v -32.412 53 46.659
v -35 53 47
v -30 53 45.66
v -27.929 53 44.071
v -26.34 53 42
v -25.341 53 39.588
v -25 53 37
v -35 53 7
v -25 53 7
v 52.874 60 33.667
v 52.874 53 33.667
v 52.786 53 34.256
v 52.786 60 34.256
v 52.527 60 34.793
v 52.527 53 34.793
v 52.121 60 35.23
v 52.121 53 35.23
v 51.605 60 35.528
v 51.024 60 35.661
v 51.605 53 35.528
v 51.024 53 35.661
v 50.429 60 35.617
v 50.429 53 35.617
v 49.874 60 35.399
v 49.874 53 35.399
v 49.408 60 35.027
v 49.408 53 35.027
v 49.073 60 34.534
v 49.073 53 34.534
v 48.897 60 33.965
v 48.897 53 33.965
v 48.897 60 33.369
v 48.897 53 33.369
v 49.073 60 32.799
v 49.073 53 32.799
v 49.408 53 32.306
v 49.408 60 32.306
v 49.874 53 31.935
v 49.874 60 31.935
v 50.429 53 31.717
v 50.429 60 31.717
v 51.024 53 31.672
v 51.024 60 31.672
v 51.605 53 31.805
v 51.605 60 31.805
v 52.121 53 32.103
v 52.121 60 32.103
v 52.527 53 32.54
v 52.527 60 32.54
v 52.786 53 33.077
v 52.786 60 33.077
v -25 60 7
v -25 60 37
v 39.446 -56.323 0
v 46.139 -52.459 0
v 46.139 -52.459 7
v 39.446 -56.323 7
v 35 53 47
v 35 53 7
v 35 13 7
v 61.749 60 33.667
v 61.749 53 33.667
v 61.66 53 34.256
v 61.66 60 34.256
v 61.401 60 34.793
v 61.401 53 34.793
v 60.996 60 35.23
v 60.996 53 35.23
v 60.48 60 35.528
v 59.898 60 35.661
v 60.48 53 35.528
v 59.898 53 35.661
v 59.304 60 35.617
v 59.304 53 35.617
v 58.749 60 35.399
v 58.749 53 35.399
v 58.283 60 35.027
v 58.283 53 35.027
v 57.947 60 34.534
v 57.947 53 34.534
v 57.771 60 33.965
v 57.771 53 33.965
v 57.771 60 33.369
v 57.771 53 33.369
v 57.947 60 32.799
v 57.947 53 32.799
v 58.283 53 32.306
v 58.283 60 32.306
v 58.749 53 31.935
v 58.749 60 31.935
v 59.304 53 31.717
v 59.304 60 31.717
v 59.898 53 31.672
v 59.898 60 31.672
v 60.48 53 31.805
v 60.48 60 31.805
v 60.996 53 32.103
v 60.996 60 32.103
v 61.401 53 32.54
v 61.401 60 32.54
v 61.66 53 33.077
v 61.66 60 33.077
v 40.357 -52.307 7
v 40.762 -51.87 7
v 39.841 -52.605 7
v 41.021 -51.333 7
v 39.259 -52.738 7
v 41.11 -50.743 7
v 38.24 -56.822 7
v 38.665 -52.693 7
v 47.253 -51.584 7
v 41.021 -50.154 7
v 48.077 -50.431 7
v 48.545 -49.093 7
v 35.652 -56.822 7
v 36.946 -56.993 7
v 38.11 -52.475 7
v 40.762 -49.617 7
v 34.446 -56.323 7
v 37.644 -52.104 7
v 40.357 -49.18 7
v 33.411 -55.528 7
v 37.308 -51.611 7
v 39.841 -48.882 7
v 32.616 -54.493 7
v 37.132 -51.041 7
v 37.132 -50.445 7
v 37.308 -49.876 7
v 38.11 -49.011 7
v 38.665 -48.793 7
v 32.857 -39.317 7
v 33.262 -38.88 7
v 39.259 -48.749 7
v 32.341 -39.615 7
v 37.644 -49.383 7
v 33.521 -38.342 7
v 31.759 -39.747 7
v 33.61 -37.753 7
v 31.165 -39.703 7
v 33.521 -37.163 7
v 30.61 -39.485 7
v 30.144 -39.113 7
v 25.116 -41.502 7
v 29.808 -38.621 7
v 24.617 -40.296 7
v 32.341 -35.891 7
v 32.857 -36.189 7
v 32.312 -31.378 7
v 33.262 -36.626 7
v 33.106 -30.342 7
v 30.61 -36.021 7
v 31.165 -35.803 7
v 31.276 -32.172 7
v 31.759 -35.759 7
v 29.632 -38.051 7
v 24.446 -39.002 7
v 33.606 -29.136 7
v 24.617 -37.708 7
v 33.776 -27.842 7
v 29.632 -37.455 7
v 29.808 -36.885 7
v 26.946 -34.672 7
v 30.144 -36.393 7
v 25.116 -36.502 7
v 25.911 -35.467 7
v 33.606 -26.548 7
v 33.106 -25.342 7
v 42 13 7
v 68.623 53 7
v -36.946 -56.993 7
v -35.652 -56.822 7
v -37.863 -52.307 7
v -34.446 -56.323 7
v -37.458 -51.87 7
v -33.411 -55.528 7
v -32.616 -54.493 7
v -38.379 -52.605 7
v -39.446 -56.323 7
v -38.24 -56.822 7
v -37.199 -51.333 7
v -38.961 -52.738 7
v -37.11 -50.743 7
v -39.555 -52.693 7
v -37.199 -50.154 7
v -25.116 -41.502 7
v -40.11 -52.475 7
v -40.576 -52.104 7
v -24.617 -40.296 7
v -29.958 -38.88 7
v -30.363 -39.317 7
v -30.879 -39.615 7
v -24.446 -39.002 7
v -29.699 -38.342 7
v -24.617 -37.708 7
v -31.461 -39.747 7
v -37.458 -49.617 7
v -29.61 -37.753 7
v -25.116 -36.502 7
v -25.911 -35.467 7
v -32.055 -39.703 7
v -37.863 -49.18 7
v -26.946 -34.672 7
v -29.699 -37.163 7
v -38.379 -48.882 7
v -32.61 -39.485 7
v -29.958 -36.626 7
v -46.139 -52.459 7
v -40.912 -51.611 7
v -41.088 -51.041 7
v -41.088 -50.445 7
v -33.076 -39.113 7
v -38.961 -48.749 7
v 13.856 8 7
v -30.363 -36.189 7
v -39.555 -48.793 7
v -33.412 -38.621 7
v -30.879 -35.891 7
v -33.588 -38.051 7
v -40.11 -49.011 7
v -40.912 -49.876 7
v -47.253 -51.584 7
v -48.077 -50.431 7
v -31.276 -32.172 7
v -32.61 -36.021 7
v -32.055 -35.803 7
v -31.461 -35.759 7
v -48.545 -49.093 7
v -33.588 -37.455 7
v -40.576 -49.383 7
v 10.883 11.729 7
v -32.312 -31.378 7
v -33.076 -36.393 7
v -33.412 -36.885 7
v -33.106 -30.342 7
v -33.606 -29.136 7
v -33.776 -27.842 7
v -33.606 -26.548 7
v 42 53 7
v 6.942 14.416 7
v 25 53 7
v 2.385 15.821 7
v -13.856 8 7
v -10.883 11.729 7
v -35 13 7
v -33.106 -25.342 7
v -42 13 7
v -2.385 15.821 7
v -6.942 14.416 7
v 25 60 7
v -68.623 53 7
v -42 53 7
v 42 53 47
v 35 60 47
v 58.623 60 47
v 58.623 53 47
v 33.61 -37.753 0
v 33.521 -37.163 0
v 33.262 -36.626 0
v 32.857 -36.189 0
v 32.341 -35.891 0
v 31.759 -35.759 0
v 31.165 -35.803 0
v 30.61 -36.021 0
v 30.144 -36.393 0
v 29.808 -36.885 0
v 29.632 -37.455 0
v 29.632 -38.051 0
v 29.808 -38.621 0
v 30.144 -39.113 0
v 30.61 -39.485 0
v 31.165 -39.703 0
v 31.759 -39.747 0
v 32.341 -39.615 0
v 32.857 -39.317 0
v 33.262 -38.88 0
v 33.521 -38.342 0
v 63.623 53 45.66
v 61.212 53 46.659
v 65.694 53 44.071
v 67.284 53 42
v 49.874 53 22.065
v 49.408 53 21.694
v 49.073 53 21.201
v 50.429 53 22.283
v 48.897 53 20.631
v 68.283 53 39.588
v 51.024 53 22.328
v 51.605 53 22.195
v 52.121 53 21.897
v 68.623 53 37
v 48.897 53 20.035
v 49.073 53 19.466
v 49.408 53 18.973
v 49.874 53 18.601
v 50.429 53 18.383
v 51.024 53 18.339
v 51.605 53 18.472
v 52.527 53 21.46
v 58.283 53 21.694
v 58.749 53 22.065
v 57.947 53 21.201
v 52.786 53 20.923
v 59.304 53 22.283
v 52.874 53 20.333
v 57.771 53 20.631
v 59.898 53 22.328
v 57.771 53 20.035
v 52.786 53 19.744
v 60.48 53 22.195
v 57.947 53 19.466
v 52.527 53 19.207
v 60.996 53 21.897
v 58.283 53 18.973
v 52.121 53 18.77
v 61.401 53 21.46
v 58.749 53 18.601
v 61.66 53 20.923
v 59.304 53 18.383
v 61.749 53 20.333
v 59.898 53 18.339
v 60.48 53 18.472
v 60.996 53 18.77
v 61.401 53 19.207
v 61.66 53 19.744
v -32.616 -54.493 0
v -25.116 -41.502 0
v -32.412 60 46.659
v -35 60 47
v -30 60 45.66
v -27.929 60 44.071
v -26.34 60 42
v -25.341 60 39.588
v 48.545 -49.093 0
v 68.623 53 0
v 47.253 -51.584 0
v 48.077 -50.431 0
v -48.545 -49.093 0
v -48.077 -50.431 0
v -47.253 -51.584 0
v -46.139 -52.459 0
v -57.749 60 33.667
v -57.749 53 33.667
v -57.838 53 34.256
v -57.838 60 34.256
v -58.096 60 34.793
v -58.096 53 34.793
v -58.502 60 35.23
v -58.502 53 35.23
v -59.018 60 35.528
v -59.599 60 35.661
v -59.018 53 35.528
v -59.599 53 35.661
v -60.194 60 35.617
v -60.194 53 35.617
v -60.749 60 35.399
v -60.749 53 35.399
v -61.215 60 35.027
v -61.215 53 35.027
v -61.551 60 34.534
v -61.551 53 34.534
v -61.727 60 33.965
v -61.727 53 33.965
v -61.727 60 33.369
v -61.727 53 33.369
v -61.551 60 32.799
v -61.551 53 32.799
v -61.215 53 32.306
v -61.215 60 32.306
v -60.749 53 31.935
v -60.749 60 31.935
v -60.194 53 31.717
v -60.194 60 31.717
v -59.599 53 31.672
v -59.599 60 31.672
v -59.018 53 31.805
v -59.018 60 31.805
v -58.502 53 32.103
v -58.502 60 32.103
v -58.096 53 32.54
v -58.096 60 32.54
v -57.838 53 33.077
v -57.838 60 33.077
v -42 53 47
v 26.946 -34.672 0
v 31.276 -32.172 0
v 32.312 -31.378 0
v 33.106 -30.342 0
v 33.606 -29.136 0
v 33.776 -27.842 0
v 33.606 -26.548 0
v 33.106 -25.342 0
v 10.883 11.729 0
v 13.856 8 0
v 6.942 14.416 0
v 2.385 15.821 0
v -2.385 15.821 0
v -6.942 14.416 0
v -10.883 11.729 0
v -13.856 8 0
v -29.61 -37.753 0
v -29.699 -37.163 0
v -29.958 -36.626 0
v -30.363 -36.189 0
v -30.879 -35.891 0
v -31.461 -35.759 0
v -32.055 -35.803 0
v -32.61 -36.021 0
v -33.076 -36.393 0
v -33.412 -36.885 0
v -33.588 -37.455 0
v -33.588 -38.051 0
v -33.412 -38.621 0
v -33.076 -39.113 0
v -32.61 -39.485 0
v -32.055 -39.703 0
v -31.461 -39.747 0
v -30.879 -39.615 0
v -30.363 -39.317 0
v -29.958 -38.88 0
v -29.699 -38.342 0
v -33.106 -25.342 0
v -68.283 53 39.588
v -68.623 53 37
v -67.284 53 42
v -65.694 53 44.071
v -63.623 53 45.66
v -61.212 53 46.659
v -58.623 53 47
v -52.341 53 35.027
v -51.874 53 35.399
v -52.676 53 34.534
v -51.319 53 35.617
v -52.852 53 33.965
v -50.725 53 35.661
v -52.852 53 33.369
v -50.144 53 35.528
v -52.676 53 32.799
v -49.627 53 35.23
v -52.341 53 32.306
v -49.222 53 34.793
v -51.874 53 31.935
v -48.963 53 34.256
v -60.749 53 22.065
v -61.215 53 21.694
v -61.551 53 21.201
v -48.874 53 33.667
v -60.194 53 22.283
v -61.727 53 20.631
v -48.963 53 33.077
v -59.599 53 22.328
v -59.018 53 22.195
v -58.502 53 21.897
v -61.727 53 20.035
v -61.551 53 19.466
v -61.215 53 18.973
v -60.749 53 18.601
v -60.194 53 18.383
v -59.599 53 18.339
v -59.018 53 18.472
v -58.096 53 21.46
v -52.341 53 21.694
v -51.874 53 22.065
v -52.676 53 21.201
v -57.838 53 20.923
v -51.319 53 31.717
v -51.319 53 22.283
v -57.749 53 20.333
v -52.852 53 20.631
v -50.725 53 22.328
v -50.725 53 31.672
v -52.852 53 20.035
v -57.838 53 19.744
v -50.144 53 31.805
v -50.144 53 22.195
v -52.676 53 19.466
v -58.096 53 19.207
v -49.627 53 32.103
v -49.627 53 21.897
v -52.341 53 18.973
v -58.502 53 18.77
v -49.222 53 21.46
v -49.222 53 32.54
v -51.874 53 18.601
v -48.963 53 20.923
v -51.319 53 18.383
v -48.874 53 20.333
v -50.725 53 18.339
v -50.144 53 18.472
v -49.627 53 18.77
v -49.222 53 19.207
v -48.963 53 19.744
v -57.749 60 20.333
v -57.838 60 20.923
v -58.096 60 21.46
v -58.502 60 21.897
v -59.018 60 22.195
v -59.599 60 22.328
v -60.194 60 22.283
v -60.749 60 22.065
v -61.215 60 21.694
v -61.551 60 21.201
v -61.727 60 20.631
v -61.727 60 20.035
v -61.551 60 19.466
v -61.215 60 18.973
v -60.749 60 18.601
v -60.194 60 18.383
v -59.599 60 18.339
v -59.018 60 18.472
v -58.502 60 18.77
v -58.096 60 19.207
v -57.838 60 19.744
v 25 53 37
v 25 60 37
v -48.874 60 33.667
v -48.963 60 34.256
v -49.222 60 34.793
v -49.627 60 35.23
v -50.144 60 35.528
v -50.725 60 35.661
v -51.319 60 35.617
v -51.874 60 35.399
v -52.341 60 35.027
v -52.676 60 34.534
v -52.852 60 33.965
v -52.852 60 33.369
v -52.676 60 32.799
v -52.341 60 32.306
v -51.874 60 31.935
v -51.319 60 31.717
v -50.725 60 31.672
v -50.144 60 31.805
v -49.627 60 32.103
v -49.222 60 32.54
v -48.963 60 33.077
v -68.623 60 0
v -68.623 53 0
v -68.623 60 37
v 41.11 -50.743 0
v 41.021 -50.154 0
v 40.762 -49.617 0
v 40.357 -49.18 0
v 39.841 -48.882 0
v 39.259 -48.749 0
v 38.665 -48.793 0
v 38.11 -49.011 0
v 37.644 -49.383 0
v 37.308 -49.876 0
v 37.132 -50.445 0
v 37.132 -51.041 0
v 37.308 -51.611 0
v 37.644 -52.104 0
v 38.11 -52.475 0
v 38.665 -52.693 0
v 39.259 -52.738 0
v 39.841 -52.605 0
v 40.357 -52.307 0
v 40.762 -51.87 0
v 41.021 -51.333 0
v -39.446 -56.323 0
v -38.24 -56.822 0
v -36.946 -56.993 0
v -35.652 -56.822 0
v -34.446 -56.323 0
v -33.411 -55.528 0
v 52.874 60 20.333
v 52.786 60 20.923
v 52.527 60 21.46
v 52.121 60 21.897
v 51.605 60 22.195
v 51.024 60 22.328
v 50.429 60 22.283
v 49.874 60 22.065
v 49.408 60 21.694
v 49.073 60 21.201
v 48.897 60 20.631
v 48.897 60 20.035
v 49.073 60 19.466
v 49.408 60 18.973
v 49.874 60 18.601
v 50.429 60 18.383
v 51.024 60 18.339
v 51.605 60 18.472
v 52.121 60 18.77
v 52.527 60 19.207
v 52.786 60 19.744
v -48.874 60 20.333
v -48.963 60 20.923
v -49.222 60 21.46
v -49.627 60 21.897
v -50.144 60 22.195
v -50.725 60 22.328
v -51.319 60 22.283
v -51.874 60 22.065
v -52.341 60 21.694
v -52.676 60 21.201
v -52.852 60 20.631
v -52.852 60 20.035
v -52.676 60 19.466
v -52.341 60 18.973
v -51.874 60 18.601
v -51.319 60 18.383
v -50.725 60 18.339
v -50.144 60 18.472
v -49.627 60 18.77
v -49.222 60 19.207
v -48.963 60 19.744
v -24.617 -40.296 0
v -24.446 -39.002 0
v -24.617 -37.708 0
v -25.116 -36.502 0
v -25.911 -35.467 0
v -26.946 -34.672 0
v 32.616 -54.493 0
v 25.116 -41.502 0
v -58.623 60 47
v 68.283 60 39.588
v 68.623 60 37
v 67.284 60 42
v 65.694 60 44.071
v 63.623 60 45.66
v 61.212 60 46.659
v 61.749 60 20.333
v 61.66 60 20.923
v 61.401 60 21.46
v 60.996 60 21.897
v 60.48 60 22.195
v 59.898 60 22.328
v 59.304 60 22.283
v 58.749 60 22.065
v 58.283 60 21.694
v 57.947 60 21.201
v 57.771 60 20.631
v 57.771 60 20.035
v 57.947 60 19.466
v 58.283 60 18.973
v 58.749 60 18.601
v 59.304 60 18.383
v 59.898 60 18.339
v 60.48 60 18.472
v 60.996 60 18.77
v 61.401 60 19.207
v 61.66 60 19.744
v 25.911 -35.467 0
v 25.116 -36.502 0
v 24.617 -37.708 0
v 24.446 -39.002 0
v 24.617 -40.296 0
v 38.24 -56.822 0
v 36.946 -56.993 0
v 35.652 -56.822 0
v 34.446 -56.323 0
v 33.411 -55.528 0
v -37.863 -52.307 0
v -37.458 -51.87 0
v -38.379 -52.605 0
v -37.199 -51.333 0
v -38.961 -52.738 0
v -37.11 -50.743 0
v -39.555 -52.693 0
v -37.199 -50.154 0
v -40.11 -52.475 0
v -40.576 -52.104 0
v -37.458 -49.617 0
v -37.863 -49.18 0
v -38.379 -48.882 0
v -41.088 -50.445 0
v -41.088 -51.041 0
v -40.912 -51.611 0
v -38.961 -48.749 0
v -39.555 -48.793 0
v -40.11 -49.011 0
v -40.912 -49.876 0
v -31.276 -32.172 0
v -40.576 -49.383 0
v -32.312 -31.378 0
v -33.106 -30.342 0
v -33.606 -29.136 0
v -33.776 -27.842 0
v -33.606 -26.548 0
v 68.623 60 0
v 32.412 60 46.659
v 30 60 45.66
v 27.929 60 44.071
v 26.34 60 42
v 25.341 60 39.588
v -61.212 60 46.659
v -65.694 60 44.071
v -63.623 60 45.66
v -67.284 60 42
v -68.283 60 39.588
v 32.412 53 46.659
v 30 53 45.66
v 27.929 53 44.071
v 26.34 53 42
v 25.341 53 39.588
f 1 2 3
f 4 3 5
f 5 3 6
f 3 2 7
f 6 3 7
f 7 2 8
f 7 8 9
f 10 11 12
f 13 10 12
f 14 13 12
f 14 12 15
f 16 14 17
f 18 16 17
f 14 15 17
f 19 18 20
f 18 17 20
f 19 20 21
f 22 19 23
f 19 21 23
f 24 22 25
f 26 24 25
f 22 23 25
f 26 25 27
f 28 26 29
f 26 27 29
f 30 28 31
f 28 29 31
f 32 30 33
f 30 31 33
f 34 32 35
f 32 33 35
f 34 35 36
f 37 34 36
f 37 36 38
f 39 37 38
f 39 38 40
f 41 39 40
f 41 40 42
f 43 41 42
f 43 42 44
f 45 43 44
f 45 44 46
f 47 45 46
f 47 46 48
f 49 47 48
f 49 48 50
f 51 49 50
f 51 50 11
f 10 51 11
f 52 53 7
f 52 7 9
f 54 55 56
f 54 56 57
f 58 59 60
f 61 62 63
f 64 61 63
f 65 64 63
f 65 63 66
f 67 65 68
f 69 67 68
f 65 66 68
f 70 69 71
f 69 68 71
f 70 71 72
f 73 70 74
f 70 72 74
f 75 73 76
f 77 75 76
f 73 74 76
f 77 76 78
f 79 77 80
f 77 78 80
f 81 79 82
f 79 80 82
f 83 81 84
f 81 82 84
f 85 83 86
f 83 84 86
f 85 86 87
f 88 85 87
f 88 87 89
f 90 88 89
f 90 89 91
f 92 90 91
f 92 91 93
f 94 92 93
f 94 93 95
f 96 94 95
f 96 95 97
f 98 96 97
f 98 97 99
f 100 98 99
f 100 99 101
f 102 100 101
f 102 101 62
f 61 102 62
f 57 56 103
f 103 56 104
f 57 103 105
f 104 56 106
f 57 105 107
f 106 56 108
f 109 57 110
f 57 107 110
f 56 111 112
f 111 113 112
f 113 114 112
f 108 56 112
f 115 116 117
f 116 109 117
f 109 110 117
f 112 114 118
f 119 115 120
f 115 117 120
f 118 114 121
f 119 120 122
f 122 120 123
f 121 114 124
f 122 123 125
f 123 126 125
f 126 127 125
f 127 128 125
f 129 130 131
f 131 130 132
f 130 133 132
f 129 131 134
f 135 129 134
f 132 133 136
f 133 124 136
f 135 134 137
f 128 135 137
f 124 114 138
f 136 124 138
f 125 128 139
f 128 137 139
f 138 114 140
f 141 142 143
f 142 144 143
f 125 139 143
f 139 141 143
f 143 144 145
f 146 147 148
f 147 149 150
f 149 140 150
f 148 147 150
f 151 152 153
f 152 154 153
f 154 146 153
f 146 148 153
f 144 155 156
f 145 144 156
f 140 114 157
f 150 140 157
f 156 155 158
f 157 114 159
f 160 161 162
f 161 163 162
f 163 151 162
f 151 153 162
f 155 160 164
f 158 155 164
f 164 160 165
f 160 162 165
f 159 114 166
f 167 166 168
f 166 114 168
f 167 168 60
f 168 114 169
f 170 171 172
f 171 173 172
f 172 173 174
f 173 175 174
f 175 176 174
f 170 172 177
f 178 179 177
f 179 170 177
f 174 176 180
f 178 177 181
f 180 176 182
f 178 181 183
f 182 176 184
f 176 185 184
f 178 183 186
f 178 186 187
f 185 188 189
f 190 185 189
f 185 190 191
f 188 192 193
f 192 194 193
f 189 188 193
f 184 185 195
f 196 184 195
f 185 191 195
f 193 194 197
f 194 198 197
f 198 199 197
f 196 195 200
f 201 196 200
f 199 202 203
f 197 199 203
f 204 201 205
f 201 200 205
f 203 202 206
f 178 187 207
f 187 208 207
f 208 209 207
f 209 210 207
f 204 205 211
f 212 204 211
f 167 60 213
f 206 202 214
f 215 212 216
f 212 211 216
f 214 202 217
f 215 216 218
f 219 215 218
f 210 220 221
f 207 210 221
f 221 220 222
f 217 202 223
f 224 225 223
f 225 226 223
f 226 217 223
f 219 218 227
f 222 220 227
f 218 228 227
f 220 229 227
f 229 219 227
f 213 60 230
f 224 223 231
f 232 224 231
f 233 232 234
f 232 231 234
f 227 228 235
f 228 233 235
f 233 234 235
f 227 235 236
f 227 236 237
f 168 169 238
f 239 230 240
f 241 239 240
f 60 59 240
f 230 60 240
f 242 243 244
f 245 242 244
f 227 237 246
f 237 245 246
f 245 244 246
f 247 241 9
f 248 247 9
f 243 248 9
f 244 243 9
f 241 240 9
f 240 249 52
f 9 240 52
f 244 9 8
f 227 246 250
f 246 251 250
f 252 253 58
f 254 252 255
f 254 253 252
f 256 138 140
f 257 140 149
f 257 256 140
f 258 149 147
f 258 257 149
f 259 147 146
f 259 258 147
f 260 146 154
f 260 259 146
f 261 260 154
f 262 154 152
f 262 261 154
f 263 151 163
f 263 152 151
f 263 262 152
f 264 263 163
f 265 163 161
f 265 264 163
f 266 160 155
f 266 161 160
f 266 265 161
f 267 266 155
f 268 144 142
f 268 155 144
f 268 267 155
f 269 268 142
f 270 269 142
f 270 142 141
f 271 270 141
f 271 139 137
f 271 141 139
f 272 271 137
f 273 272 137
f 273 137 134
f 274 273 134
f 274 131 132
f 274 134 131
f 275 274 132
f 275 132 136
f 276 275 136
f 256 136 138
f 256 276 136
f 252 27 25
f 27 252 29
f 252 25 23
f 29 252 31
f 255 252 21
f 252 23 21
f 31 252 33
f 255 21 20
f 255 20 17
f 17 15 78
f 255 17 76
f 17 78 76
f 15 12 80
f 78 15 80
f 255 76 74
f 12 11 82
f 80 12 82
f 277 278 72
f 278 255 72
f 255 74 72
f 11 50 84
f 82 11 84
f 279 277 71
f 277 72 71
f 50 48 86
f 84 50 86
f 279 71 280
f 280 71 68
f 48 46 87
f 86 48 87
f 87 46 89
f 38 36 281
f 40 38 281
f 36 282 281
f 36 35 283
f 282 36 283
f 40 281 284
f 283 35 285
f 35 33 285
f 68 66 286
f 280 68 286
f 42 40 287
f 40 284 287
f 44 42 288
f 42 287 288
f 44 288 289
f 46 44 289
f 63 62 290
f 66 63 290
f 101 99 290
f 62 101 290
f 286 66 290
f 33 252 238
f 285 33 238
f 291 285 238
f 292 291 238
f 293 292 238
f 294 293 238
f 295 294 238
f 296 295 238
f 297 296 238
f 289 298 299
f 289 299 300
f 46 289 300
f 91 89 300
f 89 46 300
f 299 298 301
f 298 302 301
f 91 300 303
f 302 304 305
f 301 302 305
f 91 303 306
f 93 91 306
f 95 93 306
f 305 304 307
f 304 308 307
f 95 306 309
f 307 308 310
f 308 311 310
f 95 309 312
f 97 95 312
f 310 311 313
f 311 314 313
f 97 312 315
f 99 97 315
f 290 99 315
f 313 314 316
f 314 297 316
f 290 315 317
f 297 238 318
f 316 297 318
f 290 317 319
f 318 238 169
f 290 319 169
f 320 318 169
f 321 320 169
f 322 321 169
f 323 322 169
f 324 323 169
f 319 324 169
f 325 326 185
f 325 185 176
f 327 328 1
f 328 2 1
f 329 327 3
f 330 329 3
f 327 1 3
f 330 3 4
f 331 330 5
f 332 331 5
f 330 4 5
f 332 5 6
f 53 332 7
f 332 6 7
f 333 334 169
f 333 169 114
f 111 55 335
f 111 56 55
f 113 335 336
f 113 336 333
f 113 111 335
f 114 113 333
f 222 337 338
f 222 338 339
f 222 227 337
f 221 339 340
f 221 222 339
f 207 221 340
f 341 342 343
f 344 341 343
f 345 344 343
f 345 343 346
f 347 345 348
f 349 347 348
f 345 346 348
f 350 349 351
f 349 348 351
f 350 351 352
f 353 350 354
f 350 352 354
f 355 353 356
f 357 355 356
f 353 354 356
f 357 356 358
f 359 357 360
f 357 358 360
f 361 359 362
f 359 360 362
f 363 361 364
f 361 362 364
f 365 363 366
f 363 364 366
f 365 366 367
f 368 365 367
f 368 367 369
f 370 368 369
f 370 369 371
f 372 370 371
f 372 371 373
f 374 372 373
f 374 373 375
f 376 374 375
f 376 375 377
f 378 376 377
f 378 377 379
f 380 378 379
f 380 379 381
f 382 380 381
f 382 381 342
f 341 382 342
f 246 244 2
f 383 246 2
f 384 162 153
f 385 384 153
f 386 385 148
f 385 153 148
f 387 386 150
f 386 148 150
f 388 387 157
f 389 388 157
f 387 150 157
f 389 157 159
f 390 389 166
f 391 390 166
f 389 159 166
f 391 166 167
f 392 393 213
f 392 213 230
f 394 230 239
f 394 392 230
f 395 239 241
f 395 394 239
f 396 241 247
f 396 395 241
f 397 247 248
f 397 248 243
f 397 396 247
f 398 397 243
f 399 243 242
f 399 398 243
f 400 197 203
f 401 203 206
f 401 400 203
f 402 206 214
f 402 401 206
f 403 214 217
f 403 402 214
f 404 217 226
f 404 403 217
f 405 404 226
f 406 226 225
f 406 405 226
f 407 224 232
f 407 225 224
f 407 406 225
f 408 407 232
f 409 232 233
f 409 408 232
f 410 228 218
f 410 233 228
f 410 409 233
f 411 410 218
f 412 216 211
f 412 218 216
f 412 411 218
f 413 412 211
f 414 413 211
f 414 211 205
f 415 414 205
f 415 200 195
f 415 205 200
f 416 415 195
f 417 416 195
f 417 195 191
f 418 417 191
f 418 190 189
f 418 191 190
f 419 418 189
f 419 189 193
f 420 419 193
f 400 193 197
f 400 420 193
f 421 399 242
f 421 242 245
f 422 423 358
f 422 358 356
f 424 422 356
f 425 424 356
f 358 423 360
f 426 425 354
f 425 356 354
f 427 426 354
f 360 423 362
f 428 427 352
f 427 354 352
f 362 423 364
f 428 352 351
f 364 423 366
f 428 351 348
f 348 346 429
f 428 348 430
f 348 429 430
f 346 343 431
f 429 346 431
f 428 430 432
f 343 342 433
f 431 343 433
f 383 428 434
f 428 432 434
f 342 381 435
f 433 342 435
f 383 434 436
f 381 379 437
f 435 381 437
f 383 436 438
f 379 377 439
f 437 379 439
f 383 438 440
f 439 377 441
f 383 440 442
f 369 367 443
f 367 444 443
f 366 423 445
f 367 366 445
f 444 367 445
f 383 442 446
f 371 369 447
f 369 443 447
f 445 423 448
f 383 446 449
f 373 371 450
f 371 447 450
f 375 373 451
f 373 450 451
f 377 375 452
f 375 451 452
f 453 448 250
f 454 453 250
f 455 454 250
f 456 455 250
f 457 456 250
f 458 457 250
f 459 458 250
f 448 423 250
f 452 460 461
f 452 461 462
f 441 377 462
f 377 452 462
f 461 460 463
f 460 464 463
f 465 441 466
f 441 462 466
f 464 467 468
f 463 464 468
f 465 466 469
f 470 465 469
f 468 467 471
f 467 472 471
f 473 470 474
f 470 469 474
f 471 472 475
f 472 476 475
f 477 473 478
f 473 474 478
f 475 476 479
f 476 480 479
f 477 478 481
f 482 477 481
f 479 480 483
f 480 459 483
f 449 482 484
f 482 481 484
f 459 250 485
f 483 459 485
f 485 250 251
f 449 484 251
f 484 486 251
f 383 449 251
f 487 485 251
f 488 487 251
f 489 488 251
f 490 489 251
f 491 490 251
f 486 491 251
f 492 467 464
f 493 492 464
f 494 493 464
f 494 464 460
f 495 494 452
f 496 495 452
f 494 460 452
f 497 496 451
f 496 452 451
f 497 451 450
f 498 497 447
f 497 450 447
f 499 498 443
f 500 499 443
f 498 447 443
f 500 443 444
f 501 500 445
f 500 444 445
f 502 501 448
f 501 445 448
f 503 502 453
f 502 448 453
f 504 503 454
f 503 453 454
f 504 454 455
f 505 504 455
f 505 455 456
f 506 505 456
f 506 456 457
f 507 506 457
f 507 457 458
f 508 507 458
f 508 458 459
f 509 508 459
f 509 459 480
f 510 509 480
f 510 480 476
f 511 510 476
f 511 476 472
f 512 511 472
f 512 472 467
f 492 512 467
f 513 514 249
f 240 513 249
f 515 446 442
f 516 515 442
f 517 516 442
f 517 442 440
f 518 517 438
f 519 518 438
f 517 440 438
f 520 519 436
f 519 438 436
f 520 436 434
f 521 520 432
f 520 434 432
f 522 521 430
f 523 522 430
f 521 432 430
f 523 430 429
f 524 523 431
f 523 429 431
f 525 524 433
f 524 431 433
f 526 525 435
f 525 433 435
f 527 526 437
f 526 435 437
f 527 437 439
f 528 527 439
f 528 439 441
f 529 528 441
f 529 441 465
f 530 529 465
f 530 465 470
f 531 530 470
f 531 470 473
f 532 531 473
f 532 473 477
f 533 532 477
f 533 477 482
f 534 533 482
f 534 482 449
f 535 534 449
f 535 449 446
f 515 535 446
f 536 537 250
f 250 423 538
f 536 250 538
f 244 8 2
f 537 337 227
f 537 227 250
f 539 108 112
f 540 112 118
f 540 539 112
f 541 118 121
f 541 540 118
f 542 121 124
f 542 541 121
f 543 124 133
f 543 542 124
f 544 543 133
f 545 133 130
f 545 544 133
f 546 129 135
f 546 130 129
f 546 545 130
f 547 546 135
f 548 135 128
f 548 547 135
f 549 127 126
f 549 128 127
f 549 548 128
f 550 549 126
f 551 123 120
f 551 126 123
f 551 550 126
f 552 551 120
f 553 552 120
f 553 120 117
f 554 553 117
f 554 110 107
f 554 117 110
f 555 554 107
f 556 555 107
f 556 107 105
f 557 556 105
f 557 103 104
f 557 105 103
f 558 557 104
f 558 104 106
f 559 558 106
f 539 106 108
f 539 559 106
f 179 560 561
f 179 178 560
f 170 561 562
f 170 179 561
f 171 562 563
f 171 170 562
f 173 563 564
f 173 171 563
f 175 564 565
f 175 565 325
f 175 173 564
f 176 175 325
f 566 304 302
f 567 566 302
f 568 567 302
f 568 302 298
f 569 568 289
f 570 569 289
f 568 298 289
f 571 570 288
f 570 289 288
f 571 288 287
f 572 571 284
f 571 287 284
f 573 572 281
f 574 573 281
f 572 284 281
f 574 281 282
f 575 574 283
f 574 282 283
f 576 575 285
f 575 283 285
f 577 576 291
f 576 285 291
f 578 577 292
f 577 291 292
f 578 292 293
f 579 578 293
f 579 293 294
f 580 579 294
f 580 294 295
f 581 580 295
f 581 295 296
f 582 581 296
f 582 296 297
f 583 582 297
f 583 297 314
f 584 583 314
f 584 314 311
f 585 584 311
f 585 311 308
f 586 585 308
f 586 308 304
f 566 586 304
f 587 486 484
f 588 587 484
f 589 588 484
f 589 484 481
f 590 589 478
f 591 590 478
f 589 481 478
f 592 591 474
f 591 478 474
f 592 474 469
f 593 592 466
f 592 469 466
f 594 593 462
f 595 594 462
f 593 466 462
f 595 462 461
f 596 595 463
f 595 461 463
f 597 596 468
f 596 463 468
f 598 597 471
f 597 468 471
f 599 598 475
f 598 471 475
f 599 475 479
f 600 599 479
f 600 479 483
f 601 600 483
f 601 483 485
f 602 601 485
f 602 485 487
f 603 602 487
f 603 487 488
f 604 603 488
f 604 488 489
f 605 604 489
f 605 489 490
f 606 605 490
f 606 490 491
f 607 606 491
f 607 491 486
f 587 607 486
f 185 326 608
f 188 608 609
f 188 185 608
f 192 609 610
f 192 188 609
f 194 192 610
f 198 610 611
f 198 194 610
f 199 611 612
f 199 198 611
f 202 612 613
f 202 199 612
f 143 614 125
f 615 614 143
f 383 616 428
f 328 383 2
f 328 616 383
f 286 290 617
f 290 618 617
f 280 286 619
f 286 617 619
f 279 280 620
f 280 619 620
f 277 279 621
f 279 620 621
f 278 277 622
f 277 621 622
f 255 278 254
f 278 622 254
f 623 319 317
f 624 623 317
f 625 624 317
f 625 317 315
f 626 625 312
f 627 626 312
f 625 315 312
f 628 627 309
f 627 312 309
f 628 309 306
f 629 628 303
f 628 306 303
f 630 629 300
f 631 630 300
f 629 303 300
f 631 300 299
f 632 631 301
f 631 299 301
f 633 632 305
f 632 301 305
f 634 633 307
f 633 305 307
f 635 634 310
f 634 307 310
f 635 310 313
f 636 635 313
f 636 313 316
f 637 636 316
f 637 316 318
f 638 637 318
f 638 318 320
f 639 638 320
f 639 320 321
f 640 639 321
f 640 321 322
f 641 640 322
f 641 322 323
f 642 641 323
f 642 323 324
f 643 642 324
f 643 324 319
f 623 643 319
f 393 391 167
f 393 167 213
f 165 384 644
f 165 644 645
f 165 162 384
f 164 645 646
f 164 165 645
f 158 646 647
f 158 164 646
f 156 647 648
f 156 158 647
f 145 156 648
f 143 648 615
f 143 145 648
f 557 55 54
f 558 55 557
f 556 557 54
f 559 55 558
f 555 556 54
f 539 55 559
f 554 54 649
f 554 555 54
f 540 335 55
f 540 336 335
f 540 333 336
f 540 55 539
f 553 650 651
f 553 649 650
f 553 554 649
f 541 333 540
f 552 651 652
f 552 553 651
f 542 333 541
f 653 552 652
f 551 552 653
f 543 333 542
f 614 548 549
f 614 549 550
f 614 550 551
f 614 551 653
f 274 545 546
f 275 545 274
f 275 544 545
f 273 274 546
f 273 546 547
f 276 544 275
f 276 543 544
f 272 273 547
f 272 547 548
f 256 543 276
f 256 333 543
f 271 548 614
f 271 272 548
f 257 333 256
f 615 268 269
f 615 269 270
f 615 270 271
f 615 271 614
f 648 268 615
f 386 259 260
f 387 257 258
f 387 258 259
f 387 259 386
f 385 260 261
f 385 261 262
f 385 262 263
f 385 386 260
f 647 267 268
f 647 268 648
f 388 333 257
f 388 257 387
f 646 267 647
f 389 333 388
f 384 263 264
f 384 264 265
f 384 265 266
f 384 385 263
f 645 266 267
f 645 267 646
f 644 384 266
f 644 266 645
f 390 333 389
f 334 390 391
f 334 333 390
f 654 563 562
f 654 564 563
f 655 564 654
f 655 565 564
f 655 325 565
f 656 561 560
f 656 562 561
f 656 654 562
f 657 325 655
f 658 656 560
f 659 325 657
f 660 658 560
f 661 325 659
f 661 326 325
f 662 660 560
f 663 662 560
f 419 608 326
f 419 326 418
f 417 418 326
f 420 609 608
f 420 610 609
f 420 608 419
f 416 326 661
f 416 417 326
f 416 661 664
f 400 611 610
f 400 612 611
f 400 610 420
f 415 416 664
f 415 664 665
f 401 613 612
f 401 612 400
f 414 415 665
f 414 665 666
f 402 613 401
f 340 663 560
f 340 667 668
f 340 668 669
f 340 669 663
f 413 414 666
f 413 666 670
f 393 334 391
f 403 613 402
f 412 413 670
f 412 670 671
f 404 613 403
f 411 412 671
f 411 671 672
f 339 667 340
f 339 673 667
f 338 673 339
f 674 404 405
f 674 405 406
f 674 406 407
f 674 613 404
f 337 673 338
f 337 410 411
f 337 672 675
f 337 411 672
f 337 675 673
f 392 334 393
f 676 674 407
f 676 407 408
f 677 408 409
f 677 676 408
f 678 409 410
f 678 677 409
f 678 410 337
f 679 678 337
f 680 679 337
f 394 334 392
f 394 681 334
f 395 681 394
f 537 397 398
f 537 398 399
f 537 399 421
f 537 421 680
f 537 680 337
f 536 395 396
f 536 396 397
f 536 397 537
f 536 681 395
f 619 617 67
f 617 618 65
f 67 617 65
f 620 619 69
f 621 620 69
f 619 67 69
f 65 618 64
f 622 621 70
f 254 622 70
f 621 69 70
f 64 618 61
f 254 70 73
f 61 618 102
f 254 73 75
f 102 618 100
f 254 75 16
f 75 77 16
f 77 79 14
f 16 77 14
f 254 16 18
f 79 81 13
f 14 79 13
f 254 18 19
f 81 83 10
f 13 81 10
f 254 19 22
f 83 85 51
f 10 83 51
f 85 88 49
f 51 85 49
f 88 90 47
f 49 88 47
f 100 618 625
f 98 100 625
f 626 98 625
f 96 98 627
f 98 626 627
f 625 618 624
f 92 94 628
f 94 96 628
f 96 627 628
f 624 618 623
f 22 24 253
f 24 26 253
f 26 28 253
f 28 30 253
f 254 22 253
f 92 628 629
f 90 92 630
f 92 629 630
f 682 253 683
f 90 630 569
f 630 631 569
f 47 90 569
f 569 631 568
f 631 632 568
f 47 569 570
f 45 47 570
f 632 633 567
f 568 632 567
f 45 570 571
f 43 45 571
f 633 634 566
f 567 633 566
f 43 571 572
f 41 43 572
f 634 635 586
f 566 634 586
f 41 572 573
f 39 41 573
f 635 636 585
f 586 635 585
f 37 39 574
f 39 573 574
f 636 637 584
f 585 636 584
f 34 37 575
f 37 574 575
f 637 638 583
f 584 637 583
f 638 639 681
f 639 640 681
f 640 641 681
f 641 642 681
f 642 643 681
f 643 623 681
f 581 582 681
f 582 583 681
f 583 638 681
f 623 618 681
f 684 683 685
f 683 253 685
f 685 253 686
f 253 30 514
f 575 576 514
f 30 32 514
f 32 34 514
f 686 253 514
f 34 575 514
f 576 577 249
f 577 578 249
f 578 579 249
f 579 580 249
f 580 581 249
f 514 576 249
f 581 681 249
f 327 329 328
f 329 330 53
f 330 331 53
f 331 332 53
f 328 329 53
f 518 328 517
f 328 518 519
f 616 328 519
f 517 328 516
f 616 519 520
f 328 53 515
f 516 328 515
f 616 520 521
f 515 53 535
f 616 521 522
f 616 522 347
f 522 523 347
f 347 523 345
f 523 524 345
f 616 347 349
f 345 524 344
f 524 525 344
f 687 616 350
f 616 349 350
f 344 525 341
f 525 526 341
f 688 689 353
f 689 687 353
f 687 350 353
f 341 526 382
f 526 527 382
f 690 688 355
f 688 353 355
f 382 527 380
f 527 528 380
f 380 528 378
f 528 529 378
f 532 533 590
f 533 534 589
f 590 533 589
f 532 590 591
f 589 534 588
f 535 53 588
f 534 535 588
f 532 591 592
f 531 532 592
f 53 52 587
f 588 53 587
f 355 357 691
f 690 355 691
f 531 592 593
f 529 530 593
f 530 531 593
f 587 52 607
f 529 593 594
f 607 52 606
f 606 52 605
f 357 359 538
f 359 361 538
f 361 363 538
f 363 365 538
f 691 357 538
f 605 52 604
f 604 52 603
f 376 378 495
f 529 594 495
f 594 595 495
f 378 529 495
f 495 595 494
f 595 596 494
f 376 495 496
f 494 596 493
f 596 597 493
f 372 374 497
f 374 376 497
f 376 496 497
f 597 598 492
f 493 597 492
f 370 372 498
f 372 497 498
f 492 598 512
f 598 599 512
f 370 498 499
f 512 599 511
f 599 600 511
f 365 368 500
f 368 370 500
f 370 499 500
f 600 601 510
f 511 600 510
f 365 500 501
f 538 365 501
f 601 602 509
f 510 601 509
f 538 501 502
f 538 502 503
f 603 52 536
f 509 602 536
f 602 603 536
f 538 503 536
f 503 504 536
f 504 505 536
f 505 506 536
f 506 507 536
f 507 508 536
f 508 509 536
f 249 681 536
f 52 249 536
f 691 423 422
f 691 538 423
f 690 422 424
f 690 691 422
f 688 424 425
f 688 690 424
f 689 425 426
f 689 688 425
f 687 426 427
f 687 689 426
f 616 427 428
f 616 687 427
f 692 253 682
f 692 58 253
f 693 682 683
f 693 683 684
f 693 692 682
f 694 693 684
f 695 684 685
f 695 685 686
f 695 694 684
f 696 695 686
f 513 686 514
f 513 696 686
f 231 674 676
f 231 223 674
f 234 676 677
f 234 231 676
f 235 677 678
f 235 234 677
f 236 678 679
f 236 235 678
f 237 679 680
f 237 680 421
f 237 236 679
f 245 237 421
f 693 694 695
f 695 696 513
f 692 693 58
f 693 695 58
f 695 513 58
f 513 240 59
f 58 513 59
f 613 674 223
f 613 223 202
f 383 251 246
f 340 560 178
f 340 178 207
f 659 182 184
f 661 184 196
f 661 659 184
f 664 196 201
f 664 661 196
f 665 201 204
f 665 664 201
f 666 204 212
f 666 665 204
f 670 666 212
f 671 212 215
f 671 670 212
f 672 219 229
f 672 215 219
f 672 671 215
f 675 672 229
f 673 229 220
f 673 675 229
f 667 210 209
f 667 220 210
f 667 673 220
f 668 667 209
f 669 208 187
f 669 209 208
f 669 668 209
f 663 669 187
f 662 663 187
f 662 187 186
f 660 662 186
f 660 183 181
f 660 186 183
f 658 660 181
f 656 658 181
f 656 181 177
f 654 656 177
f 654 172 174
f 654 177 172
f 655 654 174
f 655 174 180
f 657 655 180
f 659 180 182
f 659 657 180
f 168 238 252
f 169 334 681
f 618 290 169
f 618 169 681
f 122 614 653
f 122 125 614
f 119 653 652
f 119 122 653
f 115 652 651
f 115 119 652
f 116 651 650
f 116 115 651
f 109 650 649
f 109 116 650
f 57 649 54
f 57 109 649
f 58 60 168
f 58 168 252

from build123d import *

# Parameters (mm, degrees)
BOSS_EXTRUDE1_DEPTH = 7
SKETCH5_R           = 2
CUT_EXTRUDE2_DEPTH  = 8
BOSS_EXTRUDE2_DEPTH = 40
CUT_EXTRUDE3_DEPTH  = 48
BOSS_EXTRUDE3_DEPTH = 7
BOSS_EXTRUDE4_DEPTH = 7
FILLET1_R           = 5
SKETCH10_W          = 50
SKETCH10_H          = 40
CUT_EXTRUDE4_DEPTH  = 117.99261314
FILLET2_R           = 10
SKETCH11_R          = 2
CUT_EXTRUDE5_DEPTH  = 8


with BuildPart() as part:
    # Sketch4 → Boss-Extrude1 (new body)
    with BuildSketch(Plane.XY):
        with BuildLine():
            Line((-13.856406461, 8), (-35.606406461, -29.672105065))
            Line((-35.606406461, -29.672105065), (-22.616025404, -37.172105065))
            Line((-22.616025404, -37.172105065), (-35.116025404, -58.822740159))
            Line((-35.116025404, -58.822740159), (-48.106406461, -51.322740159))
            Line((-48.106406461, -51.322740159), (-70, 60))
            Line((-70, 60), (70, 60))
            Line((70, 60), (48.106406461, -51.322740159))
            Line((48.106406461, -51.322740159), (35.116025404, -58.822740159))
            Line((35.116025404, -58.822740159), (22.616025404, -37.172105065))
            Line((22.616025404, -37.172105065), (35.606406461, -29.672105065))
            Line((35.606406461, -29.672105065), (13.856406461, 8))
            ThreePointArc((13.856406461, 8), (0, 16), (-13.856406461, 8))
        make_face()
    extrude(amount=BOSS_EXTRUDE1_DEPTH)

    # Sketch5 → Cut-Extrude2 (cut, through all)
    with BuildSketch(Plane.XY):
        with Locations((-39.11, -50.743315159)):
            Circle(SKETCH5_R)
        with Locations((-31.61, -37.752934102)):
            Circle(SKETCH5_R)
        with Locations((39.11, -50.743315159)):
            Circle(SKETCH5_R)
        with Locations((31.61, -37.752934102)):
            Circle(SKETCH5_R)
    extrude(amount=CUT_EXTRUDE2_DEPTH, mode=Mode.SUBTRACT)

    # Sketch6 → Boss-Extrude2 (add)
    with BuildSketch(Plane.XY.offset(7)):
        Polygon((-68.623325705, 53), (68.623325705, 53), (70, 60), (-70, 60), align=None)
    extrude(amount=BOSS_EXTRUDE2_DEPTH)

    # Sketch7 → Cut-Extrude3 (cut, through all)
    with BuildSketch(Plane.XY.offset(47)):
        Polygon((-68.623325705, 53), (-68.623325705, 60), (-70, 60), align=None)
        Polygon((68.623325705, 53), (68.623325705, 60), (70, 60), align=None)
    extrude(amount=-CUT_EXTRUDE3_DEPTH, mode=Mode.SUBTRACT)

    # Sketch8 → Boss-Extrude3 (add)
    with BuildSketch(Plane.ZY.offset(35)):
        Polygon((7, 13), (47, 53), (7, 53), align=None)
    extrude(amount=BOSS_EXTRUDE3_DEPTH)

    # Sketch9 → Boss-Extrude4 (add)
    with BuildSketch(Plane(origin=(35, 0, 0), x_dir=(0, 0, -1), z_dir=(1, 0, 0))):
        Polygon((-7, 13), (-47, 53), (-7, 53), align=None)
    extrude(amount=BOSS_EXTRUDE4_DEPTH)

    # Fillet1
    fillet1_edges = [part.edges().sort_by_distance(p)[0] for p in [
        (-35.606406461, -29.672105065, 3.5),
        (-22.616025404, -37.172105065, 3.5),
        (-35.116025404, -58.822740159, 3.5),
        (-48.106406461, -51.322740159, 3.5),
        (48.106406461, -51.322740159, 3.5),
        (35.116025404, -58.822740159, 3.5),
        (22.616025404, -37.172105065, 3.5),
        (35.606406461, -29.672105065, 3.5),
    ]]
    fillet(fillet1_edges, radius=FILLET1_R)

    # Sketch10 → Cut-Extrude4 (cut, through all)
    with BuildSketch(Plane(origin=(0, 60, 0), x_dir=(1, 0, 0), z_dir=(0, 1, 0))):
        with Locations((0, -27)):
            Rectangle(SKETCH10_W, SKETCH10_H)
    extrude(amount=-CUT_EXTRUDE4_DEPTH, mode=Mode.SUBTRACT)

    # Fillet2
    fillet2_edges = [part.edges().sort_by_distance(p)[0] for p in [
        (25, 56.5, 47),
        (-25, 56.5, 47),
        (-68.623325705, 56.5, 47),
        (68.623325705, 56.5, 47),
    ]]
    fillet(fillet2_edges, radius=FILLET2_R)

    # Sketch11 → Cut-Extrude5 (cut, through all)
    with BuildSketch(Plane.XZ.offset(-53)):
        with Locations((-59.748883804, 33.666666667)):
            Circle(SKETCH11_R)
        with Locations((-50.874441902, 33.666666667)):
            Circle(SKETCH11_R)
        with Locations((-59.748883804, 20.333333333)):
            Circle(SKETCH11_R)
        with Locations((-50.874441902, 20.333333333)):
            Circle(SKETCH11_R)
        with Locations((50.874441902, 20.333333333)):
            Circle(SKETCH11_R)
        with Locations((59.748883804, 20.333333333)):
            Circle(SKETCH11_R)
        with Locations((50.874441902, 33.666666667)):
            Circle(SKETCH11_R)
        with Locations((59.748883804, 33.666666667)):
            Circle(SKETCH11_R)
    extrude(amount=-CUT_EXTRUDE5_DEPTH, mode=Mode.SUBTRACT)


solid = part.part
